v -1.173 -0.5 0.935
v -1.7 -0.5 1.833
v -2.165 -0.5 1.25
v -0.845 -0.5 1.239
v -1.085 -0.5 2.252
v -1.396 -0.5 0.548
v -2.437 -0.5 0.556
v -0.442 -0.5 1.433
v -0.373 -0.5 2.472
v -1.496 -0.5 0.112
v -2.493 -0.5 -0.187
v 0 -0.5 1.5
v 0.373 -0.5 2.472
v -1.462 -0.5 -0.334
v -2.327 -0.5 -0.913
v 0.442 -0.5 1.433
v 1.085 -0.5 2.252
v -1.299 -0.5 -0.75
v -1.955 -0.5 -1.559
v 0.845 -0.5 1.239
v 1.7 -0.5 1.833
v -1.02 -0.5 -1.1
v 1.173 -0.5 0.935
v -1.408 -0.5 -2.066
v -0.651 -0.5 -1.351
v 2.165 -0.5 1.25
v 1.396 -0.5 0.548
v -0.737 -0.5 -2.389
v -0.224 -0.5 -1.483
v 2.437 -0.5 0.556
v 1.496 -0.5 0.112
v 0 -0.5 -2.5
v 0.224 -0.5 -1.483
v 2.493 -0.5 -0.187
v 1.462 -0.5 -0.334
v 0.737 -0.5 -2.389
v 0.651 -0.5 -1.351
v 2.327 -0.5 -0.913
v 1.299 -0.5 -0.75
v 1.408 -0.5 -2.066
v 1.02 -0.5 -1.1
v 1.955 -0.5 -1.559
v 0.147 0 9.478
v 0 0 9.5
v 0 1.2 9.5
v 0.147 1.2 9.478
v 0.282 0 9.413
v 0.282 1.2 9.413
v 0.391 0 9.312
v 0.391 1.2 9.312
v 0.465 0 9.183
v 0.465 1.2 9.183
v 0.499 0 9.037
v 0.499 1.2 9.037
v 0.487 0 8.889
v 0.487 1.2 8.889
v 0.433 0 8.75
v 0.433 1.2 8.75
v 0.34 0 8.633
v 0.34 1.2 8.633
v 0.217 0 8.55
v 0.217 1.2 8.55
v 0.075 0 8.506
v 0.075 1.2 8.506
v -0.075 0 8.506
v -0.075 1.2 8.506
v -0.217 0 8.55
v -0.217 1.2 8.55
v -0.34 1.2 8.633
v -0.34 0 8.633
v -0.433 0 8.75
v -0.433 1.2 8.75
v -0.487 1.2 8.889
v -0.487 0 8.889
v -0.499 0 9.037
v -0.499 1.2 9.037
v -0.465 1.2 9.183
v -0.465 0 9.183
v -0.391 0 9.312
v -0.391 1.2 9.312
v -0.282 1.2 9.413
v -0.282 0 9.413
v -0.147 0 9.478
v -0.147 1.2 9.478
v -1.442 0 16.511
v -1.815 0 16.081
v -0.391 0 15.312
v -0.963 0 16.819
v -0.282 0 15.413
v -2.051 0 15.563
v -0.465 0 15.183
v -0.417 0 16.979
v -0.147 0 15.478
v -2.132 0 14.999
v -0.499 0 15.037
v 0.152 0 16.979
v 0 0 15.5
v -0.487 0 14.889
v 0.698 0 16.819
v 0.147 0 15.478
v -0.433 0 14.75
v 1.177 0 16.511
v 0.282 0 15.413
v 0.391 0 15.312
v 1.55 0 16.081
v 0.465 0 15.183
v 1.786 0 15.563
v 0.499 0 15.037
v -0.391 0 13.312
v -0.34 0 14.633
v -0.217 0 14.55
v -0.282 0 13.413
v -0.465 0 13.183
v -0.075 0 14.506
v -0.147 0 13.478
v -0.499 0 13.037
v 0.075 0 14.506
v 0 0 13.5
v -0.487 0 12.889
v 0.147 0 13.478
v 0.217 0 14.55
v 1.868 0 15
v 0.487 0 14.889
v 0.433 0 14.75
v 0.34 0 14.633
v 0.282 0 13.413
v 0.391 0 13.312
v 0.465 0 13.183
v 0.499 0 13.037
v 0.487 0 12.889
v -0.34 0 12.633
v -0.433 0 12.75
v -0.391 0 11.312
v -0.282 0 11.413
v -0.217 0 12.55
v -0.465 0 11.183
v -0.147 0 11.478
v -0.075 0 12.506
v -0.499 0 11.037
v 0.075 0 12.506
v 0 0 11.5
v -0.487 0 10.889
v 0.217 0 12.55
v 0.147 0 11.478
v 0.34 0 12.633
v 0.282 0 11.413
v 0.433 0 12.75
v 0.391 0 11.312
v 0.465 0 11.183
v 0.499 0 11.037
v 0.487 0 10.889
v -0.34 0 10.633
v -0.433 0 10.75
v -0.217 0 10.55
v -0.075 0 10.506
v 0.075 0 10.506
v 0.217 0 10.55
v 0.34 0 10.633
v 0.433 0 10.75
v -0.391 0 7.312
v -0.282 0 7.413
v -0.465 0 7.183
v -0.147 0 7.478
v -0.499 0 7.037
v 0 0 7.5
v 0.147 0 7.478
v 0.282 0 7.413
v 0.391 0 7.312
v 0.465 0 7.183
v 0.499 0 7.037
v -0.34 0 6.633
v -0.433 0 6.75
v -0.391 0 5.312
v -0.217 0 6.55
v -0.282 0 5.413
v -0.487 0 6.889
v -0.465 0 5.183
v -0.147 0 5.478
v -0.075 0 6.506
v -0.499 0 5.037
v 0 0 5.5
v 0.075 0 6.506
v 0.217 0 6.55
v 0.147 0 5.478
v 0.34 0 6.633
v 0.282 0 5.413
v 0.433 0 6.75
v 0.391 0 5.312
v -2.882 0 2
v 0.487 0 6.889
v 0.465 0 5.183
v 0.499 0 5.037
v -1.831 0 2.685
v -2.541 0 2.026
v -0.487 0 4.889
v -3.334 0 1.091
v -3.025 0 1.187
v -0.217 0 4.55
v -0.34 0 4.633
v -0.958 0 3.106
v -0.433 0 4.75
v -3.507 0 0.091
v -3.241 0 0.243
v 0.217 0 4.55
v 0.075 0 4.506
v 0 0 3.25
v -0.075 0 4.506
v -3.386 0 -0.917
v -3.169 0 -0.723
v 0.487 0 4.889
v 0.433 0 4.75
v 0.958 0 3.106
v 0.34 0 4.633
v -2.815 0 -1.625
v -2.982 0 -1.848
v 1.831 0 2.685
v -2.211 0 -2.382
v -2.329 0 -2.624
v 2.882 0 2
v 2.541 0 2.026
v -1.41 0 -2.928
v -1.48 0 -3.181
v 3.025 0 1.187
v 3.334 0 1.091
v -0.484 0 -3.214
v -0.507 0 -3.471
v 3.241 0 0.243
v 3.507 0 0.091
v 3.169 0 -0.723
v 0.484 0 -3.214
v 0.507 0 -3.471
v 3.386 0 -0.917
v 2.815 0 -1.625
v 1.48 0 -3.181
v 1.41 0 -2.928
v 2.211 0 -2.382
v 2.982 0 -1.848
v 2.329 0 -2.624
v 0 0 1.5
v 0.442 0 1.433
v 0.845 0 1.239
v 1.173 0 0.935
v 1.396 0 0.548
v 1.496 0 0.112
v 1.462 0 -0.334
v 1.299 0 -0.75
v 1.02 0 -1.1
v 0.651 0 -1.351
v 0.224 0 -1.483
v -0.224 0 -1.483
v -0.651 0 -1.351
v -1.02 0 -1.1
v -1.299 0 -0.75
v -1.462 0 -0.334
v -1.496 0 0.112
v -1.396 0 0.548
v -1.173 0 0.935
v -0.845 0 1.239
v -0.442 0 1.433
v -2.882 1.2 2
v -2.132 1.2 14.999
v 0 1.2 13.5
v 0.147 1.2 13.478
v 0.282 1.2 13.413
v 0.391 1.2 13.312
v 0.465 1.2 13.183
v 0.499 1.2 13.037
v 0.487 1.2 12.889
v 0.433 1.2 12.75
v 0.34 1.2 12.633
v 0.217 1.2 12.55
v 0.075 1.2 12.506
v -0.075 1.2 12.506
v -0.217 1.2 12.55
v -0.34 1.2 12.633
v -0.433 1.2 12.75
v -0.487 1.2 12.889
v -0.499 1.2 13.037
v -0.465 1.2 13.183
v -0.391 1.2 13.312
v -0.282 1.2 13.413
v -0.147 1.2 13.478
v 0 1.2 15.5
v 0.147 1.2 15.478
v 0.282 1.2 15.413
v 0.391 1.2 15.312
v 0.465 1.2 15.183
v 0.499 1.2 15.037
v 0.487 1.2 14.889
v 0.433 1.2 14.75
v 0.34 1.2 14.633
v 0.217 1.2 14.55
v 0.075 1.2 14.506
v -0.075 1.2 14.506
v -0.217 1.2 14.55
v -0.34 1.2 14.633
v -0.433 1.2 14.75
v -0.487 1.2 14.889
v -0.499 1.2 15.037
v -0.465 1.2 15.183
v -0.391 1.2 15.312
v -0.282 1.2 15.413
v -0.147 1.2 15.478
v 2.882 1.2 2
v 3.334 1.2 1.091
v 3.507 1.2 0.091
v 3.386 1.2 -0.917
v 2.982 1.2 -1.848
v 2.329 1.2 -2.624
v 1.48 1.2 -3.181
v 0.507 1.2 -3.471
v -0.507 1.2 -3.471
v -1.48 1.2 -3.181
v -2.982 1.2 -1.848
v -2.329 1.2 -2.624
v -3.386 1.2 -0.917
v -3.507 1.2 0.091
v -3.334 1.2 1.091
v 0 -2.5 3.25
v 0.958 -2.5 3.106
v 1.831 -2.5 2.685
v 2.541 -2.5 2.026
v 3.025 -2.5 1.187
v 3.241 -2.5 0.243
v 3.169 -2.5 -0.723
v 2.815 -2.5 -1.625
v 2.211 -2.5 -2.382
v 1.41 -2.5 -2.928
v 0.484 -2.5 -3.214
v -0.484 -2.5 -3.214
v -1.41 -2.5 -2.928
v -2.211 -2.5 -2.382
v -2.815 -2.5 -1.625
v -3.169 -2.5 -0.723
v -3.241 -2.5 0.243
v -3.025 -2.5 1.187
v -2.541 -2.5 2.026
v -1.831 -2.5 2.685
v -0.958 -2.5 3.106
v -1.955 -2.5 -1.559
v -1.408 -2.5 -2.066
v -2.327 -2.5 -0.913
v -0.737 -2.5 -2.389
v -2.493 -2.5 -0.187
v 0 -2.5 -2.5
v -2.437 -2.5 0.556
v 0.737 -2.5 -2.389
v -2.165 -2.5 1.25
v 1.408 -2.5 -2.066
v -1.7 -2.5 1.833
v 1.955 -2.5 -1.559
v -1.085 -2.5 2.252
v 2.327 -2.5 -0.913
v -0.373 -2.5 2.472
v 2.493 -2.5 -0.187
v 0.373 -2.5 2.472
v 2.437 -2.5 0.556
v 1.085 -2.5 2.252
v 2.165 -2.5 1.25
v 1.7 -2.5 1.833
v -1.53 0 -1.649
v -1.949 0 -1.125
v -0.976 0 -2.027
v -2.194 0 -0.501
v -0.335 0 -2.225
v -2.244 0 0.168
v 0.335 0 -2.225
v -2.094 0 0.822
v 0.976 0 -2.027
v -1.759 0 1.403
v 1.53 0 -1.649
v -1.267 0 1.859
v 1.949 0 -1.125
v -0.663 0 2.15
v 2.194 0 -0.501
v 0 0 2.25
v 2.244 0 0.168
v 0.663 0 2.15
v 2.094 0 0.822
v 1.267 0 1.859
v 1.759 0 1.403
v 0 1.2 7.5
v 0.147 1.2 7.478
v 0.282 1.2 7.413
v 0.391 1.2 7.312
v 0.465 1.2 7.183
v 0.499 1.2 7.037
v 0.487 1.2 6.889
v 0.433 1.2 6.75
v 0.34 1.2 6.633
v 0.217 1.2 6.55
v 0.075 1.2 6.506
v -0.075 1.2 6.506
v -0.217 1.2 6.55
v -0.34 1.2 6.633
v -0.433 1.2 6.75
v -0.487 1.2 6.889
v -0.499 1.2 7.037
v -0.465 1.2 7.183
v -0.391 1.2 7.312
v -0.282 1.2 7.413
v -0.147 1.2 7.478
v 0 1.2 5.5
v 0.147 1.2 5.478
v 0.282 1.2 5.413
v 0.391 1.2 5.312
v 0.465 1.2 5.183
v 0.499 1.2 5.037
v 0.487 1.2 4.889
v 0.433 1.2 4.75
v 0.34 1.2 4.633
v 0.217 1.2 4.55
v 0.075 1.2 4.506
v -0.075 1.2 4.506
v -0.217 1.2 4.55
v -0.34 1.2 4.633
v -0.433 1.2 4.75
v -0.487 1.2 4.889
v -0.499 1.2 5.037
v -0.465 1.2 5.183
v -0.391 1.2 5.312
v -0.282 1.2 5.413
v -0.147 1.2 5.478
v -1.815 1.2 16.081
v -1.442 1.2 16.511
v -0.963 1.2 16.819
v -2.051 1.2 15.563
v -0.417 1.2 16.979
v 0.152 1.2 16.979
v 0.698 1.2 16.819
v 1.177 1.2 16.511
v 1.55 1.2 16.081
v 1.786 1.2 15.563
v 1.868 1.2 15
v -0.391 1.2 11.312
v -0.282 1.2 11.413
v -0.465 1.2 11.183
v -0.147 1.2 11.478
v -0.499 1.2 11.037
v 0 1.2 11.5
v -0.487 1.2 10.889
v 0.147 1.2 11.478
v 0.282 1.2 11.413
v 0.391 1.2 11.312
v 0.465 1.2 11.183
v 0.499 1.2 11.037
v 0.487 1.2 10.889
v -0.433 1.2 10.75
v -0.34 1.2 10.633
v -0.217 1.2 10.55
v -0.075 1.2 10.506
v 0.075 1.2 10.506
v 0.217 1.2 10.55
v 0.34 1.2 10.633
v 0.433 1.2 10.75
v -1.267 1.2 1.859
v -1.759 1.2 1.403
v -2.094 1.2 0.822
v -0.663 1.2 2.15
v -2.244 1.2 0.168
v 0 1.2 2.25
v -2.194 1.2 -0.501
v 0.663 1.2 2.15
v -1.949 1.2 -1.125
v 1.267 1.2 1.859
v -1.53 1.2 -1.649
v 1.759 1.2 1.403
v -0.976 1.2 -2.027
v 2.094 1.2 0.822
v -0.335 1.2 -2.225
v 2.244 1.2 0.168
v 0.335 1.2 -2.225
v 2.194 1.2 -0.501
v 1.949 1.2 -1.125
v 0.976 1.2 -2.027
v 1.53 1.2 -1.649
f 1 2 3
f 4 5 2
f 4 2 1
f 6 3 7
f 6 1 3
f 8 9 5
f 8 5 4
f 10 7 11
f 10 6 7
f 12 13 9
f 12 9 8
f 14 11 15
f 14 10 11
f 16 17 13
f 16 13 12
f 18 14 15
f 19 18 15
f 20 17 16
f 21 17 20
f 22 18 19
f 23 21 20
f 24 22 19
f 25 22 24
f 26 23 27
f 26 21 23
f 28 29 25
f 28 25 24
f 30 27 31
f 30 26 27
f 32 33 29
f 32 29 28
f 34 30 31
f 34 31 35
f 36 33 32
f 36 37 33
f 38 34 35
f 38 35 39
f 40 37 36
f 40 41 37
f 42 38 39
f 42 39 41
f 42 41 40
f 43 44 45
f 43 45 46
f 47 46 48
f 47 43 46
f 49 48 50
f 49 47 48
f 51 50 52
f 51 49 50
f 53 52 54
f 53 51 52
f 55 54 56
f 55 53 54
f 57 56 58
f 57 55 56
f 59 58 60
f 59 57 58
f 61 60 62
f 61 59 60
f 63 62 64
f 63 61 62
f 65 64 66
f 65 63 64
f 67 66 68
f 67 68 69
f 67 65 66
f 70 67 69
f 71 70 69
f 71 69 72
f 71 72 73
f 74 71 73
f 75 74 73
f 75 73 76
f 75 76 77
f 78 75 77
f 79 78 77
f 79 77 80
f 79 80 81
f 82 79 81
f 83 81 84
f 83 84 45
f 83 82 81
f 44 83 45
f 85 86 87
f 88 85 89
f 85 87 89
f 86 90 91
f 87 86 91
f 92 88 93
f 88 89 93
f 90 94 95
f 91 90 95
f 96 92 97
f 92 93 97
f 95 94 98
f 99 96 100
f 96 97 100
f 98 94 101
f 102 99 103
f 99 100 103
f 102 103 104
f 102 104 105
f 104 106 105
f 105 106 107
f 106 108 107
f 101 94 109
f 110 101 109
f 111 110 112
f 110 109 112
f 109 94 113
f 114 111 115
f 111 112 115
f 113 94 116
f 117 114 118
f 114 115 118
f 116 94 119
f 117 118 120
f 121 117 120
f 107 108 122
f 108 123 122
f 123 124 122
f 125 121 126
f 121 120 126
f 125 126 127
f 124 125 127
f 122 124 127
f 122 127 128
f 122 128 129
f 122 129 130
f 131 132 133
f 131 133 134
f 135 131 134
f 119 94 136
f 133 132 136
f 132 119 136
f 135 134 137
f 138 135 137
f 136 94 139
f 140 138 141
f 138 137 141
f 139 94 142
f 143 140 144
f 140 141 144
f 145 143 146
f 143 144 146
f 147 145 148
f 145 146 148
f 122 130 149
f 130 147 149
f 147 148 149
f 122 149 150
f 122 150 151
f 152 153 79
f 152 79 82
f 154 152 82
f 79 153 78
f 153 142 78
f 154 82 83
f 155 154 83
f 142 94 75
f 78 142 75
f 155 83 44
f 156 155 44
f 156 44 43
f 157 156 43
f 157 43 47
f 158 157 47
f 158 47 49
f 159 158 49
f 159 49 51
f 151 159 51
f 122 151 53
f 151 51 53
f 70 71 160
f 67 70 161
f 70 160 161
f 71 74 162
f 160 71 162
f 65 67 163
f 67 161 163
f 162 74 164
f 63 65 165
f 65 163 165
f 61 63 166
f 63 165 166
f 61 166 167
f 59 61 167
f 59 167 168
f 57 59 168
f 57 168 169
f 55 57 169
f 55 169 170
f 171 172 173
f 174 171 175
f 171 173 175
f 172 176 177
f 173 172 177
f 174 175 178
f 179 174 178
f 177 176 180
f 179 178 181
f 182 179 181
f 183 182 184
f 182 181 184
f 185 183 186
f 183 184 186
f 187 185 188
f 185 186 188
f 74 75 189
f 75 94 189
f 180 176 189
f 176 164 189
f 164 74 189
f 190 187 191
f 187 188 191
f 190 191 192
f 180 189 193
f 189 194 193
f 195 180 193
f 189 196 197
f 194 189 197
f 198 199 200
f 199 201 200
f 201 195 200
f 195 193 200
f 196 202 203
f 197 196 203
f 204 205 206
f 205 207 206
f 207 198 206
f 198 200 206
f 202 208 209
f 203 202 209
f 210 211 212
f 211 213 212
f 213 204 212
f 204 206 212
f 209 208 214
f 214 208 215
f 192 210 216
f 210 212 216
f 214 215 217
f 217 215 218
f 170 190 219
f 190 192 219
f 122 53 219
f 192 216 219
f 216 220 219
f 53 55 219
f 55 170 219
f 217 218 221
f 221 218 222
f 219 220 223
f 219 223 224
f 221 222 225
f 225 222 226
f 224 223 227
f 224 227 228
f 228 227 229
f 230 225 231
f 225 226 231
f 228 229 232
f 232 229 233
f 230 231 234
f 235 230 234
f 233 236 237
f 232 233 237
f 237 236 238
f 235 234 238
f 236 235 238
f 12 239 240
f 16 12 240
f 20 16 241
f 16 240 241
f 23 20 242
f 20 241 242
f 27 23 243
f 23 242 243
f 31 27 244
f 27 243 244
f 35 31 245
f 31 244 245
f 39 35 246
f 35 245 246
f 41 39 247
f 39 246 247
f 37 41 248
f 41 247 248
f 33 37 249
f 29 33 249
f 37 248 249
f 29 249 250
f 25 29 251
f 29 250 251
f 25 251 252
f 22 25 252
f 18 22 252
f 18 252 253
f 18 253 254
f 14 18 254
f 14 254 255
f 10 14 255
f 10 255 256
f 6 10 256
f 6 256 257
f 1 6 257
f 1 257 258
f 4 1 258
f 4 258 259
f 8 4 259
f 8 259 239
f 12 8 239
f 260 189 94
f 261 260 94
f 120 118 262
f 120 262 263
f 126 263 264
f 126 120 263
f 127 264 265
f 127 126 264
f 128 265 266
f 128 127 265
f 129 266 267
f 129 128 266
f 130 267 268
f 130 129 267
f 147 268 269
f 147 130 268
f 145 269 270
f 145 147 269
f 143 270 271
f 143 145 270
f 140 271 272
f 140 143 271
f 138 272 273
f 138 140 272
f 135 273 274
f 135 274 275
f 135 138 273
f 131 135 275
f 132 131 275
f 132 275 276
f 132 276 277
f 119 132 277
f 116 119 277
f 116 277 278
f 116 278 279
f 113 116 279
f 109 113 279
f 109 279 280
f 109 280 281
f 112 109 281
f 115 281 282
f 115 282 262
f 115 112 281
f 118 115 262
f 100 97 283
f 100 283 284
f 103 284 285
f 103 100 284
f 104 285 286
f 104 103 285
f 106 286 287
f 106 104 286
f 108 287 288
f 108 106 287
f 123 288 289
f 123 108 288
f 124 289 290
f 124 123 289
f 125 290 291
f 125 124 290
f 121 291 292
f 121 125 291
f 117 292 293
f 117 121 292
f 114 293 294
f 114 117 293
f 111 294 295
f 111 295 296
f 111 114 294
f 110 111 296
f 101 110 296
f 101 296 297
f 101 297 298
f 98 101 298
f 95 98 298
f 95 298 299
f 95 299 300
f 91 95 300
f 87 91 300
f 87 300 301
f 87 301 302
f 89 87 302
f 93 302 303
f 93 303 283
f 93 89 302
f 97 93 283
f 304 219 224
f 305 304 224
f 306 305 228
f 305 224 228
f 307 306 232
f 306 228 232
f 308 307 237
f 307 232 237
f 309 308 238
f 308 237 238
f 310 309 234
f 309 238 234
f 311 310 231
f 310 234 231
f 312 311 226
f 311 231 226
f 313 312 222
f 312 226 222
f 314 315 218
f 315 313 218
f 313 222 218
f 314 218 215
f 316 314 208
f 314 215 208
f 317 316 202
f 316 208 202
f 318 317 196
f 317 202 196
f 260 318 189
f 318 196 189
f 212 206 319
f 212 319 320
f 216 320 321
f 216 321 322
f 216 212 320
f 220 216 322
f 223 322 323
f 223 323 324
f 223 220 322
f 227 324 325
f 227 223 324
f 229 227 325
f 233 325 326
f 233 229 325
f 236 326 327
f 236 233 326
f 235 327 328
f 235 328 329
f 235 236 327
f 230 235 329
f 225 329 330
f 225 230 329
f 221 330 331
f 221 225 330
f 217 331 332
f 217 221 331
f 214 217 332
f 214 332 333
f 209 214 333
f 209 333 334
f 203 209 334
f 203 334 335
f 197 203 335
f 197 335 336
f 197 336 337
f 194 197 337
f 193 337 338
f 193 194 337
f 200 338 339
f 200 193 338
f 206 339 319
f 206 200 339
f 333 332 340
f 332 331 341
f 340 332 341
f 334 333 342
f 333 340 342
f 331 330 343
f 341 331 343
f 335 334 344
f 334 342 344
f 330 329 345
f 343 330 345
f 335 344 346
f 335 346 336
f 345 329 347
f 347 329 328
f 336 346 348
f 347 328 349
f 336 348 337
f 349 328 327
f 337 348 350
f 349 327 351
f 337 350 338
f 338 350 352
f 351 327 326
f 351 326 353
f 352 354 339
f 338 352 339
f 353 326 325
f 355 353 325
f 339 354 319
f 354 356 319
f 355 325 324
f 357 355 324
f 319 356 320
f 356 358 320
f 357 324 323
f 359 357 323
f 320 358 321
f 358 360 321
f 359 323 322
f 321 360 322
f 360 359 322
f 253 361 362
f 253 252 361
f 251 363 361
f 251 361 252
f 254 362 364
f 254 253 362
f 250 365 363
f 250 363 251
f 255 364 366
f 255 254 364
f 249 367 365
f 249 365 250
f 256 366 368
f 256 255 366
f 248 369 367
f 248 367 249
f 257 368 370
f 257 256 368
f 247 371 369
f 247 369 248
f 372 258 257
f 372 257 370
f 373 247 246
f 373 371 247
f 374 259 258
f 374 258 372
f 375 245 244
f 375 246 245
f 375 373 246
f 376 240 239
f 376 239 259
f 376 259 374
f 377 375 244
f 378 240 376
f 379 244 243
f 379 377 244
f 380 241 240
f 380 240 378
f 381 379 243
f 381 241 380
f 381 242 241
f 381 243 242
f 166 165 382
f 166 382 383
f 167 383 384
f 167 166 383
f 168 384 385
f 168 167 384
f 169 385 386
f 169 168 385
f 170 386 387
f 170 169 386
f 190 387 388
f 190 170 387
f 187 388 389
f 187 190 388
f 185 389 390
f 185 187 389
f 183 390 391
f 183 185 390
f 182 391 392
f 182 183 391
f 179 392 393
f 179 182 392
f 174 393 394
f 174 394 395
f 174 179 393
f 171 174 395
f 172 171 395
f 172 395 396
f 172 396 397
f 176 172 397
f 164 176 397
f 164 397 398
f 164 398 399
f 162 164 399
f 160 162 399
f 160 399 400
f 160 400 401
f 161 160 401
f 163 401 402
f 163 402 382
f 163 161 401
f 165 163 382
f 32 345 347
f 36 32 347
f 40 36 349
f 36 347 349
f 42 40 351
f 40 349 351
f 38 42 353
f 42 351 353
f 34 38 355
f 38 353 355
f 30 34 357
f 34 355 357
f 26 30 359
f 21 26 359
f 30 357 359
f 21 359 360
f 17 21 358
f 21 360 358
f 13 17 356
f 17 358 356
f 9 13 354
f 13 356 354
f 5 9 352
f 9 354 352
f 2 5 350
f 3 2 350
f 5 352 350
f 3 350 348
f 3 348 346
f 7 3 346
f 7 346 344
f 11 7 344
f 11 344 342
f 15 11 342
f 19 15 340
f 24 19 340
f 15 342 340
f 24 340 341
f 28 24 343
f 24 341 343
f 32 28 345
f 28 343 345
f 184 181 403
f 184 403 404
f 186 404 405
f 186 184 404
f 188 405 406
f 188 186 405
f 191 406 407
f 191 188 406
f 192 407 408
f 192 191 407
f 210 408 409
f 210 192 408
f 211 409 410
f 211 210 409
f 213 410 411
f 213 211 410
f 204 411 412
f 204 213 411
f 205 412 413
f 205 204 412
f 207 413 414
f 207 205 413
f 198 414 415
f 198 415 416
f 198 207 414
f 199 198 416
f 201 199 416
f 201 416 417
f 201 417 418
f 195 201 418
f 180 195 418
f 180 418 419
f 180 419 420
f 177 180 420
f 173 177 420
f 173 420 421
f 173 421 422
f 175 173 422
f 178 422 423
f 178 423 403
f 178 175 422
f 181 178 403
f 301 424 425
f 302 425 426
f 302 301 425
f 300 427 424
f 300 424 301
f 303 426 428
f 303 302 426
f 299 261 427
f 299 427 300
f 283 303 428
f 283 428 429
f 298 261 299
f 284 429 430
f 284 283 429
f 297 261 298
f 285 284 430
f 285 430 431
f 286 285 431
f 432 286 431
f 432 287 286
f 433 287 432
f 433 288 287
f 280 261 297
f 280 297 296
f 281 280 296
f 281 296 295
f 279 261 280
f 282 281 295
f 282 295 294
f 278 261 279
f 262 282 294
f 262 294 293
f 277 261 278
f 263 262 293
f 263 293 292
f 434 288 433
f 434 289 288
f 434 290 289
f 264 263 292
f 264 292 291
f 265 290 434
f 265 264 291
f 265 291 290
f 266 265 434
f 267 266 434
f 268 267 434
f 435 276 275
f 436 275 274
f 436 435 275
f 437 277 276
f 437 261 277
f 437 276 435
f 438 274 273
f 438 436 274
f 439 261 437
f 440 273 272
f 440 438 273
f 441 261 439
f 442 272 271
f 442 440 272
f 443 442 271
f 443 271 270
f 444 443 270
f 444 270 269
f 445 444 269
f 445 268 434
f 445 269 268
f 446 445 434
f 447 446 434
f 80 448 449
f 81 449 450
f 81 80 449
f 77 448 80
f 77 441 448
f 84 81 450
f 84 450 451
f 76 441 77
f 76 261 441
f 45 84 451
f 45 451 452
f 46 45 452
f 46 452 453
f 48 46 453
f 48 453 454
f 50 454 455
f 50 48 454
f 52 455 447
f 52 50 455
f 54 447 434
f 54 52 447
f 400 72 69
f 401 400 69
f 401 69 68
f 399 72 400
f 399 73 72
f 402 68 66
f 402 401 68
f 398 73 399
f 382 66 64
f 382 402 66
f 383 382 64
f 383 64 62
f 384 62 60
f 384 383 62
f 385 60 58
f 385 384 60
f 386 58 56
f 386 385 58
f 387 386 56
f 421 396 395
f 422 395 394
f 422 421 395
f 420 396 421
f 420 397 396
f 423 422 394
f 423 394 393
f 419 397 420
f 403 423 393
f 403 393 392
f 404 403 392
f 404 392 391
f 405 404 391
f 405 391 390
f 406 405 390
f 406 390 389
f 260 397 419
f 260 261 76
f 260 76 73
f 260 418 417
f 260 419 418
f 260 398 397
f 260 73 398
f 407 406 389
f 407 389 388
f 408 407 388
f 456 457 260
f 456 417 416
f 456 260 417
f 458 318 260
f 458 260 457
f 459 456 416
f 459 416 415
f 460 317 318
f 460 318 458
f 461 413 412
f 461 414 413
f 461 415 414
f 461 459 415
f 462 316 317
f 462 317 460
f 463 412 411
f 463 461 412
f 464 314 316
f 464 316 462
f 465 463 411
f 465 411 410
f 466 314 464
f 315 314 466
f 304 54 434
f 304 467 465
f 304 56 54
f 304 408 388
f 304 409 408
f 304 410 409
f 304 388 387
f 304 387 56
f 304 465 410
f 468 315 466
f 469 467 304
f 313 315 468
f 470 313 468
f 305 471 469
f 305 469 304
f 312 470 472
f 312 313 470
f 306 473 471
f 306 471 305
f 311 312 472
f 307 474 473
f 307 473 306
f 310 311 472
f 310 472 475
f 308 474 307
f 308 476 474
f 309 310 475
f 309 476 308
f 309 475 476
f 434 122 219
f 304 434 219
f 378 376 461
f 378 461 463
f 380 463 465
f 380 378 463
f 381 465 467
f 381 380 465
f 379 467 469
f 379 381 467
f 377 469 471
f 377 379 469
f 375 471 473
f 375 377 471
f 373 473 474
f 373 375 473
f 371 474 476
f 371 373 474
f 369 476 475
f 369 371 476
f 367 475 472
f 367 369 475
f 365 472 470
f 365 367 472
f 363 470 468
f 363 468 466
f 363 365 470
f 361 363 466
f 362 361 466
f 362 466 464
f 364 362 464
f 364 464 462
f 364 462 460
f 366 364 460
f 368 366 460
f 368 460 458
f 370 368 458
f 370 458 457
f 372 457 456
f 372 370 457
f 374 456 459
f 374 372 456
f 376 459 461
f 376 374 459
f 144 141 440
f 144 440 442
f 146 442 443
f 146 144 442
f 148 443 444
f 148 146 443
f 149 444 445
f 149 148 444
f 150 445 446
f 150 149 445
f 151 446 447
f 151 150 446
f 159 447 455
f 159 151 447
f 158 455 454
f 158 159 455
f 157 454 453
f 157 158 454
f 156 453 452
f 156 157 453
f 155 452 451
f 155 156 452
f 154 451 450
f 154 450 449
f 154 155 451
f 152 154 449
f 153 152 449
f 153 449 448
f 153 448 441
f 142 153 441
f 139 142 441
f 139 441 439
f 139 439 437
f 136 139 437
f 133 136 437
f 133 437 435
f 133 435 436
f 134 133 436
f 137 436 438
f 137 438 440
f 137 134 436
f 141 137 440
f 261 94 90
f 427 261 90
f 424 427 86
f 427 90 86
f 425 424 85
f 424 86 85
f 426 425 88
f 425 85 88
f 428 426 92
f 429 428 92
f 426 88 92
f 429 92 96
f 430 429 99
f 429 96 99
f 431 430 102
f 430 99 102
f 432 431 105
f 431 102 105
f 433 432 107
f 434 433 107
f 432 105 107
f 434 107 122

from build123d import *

# Parameters (mm, degrees)
SKETCH1_R           = 0.5
SKETCH1_R_2         = 3.508270012
SKETCH1_R_3         = 2.25
BOSS_EXTRUDE1_DEPTH = 1.2
SKETCH2_R           = 3.25
SKETCH2_R_2         = 1.5
BOSS_EXTRUDE2_DEPTH = 2.5
SKETCH3_R           = 2.5
CUT_EXTRUDE1_DEPTH  = 2


with BuildPart() as part:
    # Sketch1 → Boss-Extrude1 (new body)
    # profile 1 of 2: a face of its own
    with BuildSketch(Plane(origin=(0, 0, 0), x_dir=(1, 0, 0), z_dir=(0, 1, 0))):
        with BuildLine():
            ThreePointArc((2.882352941, -2), (0, -3.508270012), (-2.882352941, -2))
            Line((-2.882352941, -2), (-2.132352941, -14.999416075))
            ThreePointArc((-2.132352941, -14.999416075), (-0.132626782, -16.99941606), (1.867646984, -14.999963756))
            Line((1.867646984, -14.999963756), (2.882352941, -2))
        make_face()
        with Locations(Location((0, -15, 0), (0, 0, 270))):
            Circle(SKETCH1_R, mode=Mode.SUBTRACT)
        with Locations(Location((0, -13, 0), (0, 0, 270))):
            Circle(SKETCH1_R, mode=Mode.SUBTRACT)
        with Locations(Location((0, -11, 0), (0, 0, 270))):
            Circle(SKETCH1_R, mode=Mode.SUBTRACT)
        with Locations(Location((0, -9, 0), (0, 0, 270))):
            Circle(SKETCH1_R, mode=Mode.SUBTRACT)
        with Locations(Location((0, -7, 0), (0, 0, 270))):
            Circle(SKETCH1_R, mode=Mode.SUBTRACT)
        with Locations(Location((0, -5, 0), (0, 0, 270))):
            Circle(SKETCH1_R, mode=Mode.SUBTRACT)
    # profile 2 of 2: a face of its own
    with BuildSketch(Plane(origin=(0, 0, 0), x_dir=(1, 0, 0), z_dir=(0, 1, 0))):
        Circle(SKETCH1_R_2)
        with Locations(Location((0, 0, 0), (0, 0, 270))):
            Circle(SKETCH1_R_3, mode=Mode.SUBTRACT)
    extrude(amount=BOSS_EXTRUDE1_DEPTH)

    # Sketch2 → Boss-Extrude2 (add)
    with BuildSketch(Plane(origin=(0, 0, 0), x_dir=(1, 0, 0), z_dir=(0, 1, 0))):
        with Locations(Location((0, 0, 0), (0, 0, 270))):
            Circle(SKETCH2_R)
        with Locations(Location((0, 0, 0), (0, 0, 270))):
            Circle(SKETCH2_R_2, mode=Mode.SUBTRACT)
    extrude(amount=-BOSS_EXTRUDE2_DEPTH)

    # Sketch3 → Cut-Extrude1 (cut)
    with BuildSketch(Plane.XZ.offset(2.5)):
        with Locations(Location((0, 0, 0), (0, 0, 270))):
            Circle(SKETCH3_R)
    extrude(amount=-CUT_EXTRUDE1_DEPTH, mode=Mode.SUBTRACT)


solid = part.part
